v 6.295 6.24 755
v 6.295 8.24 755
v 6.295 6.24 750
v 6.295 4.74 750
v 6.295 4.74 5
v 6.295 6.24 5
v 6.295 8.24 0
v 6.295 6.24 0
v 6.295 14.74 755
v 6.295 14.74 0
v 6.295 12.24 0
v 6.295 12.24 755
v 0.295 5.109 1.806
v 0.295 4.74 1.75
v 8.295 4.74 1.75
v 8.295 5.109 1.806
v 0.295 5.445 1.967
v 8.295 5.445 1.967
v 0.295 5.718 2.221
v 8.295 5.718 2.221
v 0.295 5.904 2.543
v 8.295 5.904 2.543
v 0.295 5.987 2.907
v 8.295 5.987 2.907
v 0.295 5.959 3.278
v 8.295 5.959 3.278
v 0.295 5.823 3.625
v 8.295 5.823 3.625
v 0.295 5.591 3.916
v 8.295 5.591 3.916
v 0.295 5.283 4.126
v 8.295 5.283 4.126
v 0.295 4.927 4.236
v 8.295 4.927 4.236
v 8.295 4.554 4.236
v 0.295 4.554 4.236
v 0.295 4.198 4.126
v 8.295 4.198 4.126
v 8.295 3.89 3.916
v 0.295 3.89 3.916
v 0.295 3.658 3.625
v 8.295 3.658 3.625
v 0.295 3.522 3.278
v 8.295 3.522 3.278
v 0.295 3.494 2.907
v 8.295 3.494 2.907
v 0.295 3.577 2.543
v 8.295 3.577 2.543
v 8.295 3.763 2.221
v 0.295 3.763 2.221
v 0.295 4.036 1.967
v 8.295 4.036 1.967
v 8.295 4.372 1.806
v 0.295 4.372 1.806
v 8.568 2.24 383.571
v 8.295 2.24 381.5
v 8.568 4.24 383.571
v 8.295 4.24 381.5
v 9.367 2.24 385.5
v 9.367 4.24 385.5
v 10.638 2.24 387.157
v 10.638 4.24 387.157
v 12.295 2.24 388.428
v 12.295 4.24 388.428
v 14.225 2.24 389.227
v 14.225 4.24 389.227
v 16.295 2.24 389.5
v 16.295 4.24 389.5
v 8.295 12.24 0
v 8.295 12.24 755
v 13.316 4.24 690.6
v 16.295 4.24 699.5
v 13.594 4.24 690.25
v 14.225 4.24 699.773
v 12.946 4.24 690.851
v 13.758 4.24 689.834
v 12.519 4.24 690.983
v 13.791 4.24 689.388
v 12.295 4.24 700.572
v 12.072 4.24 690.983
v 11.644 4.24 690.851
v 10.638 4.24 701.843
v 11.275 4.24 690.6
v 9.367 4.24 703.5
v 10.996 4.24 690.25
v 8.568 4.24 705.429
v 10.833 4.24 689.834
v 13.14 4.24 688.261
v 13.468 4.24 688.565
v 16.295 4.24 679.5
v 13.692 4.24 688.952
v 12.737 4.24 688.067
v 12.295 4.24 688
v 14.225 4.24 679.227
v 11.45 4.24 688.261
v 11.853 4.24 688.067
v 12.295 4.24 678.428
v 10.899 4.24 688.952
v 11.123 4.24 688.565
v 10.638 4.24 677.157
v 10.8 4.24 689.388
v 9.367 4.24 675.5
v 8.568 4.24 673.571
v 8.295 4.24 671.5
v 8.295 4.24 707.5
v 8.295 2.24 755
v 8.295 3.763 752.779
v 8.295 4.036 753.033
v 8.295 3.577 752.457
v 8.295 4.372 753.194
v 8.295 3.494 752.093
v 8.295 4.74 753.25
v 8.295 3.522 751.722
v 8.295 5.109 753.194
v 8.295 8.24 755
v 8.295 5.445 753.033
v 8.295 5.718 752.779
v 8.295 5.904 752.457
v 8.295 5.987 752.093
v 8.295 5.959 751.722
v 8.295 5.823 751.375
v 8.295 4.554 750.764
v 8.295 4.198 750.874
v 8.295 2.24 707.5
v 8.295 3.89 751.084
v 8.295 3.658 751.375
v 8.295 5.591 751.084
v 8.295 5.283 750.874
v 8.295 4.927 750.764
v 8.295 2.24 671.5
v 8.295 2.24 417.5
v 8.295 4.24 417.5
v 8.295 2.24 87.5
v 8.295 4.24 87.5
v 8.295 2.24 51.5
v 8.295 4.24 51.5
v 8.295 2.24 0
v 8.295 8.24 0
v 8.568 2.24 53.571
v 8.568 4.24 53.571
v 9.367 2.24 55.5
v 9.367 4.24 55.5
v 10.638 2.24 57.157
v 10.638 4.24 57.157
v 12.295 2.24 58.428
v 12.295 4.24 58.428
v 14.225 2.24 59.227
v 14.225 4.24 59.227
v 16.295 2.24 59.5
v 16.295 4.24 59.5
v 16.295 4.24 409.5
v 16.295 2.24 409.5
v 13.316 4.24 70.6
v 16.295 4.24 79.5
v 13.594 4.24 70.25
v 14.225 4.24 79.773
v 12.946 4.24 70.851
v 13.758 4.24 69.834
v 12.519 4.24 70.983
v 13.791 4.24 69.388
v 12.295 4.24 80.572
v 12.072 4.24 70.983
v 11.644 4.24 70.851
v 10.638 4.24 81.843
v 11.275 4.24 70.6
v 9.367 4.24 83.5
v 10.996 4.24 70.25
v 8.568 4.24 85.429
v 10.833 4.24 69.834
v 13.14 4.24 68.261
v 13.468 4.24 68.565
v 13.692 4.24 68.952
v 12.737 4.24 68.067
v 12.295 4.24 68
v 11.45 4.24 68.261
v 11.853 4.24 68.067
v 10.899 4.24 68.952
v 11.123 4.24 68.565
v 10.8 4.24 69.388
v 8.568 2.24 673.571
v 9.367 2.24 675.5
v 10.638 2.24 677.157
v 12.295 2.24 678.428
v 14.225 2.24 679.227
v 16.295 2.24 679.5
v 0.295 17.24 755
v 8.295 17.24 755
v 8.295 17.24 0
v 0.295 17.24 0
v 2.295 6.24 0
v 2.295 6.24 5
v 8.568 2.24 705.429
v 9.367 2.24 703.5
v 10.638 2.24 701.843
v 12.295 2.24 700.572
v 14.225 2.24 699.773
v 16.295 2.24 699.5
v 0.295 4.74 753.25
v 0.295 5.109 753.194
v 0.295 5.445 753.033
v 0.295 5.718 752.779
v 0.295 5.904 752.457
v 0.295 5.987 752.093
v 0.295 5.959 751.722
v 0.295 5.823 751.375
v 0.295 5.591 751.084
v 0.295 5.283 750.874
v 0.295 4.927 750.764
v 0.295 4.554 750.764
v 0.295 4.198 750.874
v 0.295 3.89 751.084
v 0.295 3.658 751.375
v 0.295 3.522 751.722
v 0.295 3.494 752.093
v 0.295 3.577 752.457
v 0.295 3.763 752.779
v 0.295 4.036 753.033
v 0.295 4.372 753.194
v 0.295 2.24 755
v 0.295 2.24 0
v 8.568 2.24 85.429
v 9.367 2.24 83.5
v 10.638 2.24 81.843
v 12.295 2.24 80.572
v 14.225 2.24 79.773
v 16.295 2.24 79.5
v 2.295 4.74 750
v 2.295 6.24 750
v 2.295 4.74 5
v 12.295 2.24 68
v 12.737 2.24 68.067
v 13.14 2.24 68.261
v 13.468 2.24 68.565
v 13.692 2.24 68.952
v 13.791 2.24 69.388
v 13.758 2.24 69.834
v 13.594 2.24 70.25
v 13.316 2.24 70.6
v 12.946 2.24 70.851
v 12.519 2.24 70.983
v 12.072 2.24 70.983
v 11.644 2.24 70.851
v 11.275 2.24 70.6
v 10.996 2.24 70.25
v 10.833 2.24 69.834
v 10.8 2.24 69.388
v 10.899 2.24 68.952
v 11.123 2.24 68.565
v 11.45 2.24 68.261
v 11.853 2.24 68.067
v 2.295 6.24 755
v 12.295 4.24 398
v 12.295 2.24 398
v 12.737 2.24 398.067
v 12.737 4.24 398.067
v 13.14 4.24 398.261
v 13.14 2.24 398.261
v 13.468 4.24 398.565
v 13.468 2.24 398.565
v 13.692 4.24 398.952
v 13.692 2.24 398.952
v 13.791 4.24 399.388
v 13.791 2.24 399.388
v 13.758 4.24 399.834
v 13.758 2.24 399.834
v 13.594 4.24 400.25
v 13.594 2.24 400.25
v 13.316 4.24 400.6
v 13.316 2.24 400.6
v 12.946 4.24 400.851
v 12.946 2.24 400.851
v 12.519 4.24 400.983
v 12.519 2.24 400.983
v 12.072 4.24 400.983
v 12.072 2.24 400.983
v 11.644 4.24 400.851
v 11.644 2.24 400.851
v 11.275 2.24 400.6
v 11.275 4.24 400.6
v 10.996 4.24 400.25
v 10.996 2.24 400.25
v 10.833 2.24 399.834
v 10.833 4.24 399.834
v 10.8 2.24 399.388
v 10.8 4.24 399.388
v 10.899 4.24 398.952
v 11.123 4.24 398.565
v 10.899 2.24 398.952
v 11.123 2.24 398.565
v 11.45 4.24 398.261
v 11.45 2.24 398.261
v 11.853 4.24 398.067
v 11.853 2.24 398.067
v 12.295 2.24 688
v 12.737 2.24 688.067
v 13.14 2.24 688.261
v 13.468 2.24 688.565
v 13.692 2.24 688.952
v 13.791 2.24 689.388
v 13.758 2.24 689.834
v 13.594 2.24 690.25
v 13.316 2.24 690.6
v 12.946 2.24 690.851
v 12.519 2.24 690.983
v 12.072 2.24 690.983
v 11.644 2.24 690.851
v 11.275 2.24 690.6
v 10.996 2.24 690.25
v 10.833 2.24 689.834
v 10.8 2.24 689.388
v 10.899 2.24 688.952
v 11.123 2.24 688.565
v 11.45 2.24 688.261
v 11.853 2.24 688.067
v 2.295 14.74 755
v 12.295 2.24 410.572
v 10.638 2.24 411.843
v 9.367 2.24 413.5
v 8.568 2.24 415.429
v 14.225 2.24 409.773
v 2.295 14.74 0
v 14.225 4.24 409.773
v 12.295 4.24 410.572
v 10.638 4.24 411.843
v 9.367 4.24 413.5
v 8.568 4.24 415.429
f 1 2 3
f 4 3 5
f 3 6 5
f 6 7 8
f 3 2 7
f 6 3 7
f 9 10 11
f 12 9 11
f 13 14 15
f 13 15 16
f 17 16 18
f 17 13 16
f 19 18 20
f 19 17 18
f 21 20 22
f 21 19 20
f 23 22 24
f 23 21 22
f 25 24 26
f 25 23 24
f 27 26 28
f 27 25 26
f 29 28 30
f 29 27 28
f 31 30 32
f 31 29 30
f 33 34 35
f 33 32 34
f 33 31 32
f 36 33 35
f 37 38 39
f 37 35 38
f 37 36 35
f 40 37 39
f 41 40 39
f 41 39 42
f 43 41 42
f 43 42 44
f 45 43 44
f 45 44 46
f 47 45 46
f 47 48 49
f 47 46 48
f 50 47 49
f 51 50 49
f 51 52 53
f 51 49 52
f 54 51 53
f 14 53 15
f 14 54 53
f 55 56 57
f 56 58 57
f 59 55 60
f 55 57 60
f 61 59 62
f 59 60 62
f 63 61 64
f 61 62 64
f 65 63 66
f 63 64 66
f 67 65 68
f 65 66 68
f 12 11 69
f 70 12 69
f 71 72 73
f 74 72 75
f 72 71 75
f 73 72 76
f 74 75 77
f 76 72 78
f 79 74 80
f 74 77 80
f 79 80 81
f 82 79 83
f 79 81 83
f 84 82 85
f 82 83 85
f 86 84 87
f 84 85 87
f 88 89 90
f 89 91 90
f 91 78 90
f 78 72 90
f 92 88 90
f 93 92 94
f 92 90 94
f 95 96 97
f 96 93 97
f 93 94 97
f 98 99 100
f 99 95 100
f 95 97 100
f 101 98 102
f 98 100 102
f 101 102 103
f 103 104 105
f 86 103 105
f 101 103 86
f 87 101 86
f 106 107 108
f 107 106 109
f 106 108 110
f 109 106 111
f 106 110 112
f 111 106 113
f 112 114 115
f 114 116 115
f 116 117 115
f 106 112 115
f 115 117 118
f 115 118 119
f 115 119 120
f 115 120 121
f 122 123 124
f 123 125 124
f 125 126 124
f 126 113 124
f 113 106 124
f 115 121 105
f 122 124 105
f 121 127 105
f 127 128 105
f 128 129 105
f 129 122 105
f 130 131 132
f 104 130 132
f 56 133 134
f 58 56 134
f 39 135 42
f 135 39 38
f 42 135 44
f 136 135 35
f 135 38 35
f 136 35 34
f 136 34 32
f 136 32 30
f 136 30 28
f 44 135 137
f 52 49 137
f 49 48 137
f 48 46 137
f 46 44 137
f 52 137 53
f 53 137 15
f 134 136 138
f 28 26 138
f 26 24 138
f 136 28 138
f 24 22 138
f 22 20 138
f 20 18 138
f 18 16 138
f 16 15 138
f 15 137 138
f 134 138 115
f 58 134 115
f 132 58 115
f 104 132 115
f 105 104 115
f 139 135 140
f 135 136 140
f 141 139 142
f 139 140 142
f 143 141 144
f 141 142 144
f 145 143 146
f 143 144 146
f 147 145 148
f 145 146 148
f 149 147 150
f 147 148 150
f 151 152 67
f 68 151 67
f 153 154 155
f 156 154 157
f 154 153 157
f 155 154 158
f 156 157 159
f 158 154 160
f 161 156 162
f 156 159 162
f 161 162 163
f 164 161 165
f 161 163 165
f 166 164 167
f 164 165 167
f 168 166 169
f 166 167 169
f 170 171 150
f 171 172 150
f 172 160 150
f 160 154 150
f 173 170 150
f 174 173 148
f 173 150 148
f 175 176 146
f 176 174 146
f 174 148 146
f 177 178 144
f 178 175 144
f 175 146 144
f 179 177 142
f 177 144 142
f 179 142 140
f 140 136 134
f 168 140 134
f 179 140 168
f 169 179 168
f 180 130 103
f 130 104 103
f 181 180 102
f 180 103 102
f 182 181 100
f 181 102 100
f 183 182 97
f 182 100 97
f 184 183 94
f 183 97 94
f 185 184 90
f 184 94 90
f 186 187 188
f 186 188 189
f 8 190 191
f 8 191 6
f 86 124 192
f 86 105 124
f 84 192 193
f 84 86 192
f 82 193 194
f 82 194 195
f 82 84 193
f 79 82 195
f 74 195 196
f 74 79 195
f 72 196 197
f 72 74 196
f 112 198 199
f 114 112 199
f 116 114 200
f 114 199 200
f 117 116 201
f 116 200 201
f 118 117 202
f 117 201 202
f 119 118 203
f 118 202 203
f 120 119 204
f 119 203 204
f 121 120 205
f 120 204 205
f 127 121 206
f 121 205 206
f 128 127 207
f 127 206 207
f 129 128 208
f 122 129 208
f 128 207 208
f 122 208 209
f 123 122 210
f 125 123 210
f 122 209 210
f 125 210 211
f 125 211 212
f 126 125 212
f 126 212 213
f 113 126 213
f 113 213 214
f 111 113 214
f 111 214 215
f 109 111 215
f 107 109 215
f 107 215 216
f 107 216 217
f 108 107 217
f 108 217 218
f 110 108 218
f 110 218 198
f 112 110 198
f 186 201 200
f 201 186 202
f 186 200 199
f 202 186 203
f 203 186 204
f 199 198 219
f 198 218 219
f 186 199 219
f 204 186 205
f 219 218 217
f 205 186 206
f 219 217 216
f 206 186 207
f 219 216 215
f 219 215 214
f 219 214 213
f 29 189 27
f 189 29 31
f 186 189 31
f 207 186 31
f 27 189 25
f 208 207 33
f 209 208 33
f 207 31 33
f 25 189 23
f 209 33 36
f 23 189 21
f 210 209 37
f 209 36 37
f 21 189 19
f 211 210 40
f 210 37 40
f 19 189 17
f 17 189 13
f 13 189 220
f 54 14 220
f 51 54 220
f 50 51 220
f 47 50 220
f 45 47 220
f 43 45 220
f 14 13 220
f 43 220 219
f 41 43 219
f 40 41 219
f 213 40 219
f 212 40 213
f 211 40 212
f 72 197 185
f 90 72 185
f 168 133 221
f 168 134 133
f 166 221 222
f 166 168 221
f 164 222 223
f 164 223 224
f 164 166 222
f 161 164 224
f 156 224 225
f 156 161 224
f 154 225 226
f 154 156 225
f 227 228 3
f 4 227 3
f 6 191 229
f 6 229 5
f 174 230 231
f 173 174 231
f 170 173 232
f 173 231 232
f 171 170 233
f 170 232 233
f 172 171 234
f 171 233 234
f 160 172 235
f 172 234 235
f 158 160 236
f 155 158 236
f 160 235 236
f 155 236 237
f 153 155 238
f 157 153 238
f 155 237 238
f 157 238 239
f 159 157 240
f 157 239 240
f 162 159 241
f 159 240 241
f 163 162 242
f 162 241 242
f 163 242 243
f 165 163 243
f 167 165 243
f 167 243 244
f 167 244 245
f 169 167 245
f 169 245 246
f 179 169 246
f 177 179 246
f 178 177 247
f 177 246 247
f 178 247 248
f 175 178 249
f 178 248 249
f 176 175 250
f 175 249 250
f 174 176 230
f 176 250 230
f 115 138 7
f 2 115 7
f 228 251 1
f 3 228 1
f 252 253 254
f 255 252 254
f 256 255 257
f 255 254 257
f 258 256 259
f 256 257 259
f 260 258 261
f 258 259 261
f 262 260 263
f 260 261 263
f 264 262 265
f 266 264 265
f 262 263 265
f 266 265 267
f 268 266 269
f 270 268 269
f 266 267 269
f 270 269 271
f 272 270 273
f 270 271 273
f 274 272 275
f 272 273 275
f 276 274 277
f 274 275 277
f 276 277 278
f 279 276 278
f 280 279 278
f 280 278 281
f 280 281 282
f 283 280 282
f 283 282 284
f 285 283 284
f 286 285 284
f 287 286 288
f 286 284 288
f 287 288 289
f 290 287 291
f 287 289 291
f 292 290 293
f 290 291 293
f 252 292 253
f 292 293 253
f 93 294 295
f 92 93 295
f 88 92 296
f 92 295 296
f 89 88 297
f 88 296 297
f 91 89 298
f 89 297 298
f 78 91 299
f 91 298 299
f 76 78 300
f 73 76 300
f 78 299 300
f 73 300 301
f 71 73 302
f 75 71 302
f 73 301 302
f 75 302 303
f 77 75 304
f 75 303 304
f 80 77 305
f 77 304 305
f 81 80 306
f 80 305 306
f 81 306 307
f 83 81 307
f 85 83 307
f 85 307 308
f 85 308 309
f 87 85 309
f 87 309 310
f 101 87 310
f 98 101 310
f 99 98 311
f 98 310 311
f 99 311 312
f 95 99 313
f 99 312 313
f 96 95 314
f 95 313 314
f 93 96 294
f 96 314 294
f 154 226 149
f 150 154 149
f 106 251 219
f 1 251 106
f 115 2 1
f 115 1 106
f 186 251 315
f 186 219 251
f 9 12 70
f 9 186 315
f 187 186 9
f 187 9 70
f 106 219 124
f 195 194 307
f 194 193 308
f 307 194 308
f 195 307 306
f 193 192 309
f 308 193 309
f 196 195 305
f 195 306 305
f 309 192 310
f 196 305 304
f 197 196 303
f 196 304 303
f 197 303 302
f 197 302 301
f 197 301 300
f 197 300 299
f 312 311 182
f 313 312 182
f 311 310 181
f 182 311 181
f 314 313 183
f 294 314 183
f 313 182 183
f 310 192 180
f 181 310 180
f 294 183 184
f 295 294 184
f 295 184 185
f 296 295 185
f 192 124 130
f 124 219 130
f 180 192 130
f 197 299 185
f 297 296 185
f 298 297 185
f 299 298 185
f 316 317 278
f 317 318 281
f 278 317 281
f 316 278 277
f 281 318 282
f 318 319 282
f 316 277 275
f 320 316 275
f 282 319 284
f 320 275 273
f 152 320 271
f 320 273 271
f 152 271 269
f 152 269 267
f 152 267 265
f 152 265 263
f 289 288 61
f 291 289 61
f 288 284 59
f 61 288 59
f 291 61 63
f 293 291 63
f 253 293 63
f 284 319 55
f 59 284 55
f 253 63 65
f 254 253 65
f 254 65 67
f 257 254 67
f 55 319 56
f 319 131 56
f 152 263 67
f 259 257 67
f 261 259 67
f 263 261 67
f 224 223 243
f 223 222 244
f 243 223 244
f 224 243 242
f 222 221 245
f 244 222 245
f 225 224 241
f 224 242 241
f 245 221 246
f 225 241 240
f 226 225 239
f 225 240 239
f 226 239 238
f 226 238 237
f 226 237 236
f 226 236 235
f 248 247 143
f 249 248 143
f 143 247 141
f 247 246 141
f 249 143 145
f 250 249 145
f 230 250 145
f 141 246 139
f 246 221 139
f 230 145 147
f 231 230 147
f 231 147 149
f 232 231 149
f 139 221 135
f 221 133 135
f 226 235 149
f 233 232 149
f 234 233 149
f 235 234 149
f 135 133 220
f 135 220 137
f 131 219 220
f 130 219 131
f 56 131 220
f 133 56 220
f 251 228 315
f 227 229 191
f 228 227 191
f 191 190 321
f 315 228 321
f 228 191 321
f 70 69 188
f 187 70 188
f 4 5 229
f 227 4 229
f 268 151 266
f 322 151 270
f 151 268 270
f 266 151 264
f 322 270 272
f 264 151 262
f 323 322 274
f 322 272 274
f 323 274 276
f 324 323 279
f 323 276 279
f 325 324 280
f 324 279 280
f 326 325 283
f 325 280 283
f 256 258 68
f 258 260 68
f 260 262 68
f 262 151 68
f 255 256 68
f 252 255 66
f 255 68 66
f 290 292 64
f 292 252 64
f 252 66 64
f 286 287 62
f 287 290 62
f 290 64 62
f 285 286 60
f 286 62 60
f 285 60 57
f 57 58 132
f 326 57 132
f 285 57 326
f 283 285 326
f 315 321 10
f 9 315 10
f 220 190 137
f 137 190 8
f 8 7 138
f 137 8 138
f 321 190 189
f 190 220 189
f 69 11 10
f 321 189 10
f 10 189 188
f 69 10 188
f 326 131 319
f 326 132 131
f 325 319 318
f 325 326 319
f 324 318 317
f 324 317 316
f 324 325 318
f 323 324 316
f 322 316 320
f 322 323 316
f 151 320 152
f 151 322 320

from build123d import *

# Parameters (mm, degrees)
EXTRUDE_1_DEPTH    = 755
SKETCH_4_W         = 8
SKETCH_4_H         = 20
SKETCH_4_R         = 1.5
EXTRUDE_2_DEPTH    = 2
FILLET_1_R         = 8
SKETCH_5_W         = 4
SKETCH_5_H         = 1.5
EXTRUDE_3_DEPTH    = 5
HOLE_WIZARD_M3_2_D = 2.5


with BuildPart() as part:
    # 草图1 → 凸台-拉伸1 (new body)
    with BuildSketch(Plane.XY):
        Polygon((0.29532044, 2.240431683), (8.29532044, 2.240431683), (8.29532044, 8.240431683), (6.29532044, 8.240431683), (6.29532044, 4.740431683), (2.29532044, 4.740431683), (2.29532044, 14.740431683), (6.29532044, 14.740431683), (6.29532044, 12.240431683), (8.29532044, 12.240431683), (8.29532044, 14.740431683), (8.29532044, 17.240431683), (0.29532044, 17.240431683), align=None)
    extrude(amount=EXTRUDE_1_DEPTH)

    # 草图4 → 凸台-拉伸2 (add)
    # profile 1 of 3: a face of its own
    with BuildSketch(Plane(origin=(0, 2.240431683, 0), x_dir=(-1, 0, 0), z_dir=(0, -1, 0))):
        with Locations((-12.29532044, -689.500000045)):
            Rectangle(SKETCH_4_W, SKETCH_4_H)
        with Locations(Location((-12.29532044, -689.500000045, 0), (0, 0, 90))):
            Circle(SKETCH_4_R, mode=Mode.SUBTRACT)
    # profile 2 of 3: a face of its own
    with BuildSketch(Plane(origin=(0, 2.240431683, 0), x_dir=(-1, 0, 0), z_dir=(0, -1, 0))):
        with Locations((-12.29532044, -399.500000045)):
            Rectangle(SKETCH_4_W, SKETCH_4_H)
        with Locations(Location((-12.29532044, -399.500000045, 0), (0, 0, 90))):
            Circle(SKETCH_4_R, mode=Mode.SUBTRACT)
    # profile 3 of 3: a face of its own
    with BuildSketch(Plane(origin=(0, 2.240431683, 0), x_dir=(-1, 0, 0), z_dir=(0, -1, 0))):
        with Locations((-12.29532044, -69.500000045)):
            Rectangle(SKETCH_4_W, SKETCH_4_H)
        with Locations(Location((-12.29532044, -69.500000045, 0), (0, 0, 90))):
            Circle(SKETCH_4_R, mode=Mode.SUBTRACT)
    extrude(amount=-EXTRUDE_2_DEPTH)

    # 圆角1
    fillet_1_edges = [part.edges().sort_by_distance(p)[0] for p in [
        (8.29532044, 3.240431683, 79.500000045),
        (8.29532044, 3.240431683, 59.500000045),
        (8.29532044, 3.240431683, 389.500000045),
        (8.29532044, 3.240431683, 409.500000045),
        (8.29532044, 3.240431683, 679.500000045),
        (8.29532044, 3.240431683, 699.500000045),
    ]]
    fillet(fillet_1_edges, radius=FILLET_1_R - 0.0001)  # a hair under: the kernel refuses the full size

    # 草图5 → 凸台-拉伸3 (add)
    with BuildSketch(Plane.XY.offset(755)):
        with Locations((4.29532044, 5.490431683)):
            Rectangle(SKETCH_5_W, SKETCH_5_H)
    extrude_3 = extrude(amount=-EXTRUDE_3_DEPTH)

    # M3 螺纹孔2 (through all)
    with Locations(Plane(origin=(8.29532044, 0, 0), x_dir=(0, 0, -1), z_dir=(1, 0, 0))):
        with Locations((-752, 4.740431683)):
            hole_wizard_m3_2 = Hole(HOLE_WIZARD_M3_2_D / 2)

    # 镜向1: 凸台-拉伸3, M3 螺纹孔2 across plane
    add(extrude_3.mirror(Plane(origin=(0, 0, 377.5), x_dir=(1, 0, 0), z_dir=(0, 0, -1))))
    add(hole_wizard_m3_2.mirror(Plane(origin=(0, 0, 377.5), x_dir=(1, 0, 0), z_dir=(0, 0, -1))), mode=Mode.SUBTRACT)


solid = part.part
